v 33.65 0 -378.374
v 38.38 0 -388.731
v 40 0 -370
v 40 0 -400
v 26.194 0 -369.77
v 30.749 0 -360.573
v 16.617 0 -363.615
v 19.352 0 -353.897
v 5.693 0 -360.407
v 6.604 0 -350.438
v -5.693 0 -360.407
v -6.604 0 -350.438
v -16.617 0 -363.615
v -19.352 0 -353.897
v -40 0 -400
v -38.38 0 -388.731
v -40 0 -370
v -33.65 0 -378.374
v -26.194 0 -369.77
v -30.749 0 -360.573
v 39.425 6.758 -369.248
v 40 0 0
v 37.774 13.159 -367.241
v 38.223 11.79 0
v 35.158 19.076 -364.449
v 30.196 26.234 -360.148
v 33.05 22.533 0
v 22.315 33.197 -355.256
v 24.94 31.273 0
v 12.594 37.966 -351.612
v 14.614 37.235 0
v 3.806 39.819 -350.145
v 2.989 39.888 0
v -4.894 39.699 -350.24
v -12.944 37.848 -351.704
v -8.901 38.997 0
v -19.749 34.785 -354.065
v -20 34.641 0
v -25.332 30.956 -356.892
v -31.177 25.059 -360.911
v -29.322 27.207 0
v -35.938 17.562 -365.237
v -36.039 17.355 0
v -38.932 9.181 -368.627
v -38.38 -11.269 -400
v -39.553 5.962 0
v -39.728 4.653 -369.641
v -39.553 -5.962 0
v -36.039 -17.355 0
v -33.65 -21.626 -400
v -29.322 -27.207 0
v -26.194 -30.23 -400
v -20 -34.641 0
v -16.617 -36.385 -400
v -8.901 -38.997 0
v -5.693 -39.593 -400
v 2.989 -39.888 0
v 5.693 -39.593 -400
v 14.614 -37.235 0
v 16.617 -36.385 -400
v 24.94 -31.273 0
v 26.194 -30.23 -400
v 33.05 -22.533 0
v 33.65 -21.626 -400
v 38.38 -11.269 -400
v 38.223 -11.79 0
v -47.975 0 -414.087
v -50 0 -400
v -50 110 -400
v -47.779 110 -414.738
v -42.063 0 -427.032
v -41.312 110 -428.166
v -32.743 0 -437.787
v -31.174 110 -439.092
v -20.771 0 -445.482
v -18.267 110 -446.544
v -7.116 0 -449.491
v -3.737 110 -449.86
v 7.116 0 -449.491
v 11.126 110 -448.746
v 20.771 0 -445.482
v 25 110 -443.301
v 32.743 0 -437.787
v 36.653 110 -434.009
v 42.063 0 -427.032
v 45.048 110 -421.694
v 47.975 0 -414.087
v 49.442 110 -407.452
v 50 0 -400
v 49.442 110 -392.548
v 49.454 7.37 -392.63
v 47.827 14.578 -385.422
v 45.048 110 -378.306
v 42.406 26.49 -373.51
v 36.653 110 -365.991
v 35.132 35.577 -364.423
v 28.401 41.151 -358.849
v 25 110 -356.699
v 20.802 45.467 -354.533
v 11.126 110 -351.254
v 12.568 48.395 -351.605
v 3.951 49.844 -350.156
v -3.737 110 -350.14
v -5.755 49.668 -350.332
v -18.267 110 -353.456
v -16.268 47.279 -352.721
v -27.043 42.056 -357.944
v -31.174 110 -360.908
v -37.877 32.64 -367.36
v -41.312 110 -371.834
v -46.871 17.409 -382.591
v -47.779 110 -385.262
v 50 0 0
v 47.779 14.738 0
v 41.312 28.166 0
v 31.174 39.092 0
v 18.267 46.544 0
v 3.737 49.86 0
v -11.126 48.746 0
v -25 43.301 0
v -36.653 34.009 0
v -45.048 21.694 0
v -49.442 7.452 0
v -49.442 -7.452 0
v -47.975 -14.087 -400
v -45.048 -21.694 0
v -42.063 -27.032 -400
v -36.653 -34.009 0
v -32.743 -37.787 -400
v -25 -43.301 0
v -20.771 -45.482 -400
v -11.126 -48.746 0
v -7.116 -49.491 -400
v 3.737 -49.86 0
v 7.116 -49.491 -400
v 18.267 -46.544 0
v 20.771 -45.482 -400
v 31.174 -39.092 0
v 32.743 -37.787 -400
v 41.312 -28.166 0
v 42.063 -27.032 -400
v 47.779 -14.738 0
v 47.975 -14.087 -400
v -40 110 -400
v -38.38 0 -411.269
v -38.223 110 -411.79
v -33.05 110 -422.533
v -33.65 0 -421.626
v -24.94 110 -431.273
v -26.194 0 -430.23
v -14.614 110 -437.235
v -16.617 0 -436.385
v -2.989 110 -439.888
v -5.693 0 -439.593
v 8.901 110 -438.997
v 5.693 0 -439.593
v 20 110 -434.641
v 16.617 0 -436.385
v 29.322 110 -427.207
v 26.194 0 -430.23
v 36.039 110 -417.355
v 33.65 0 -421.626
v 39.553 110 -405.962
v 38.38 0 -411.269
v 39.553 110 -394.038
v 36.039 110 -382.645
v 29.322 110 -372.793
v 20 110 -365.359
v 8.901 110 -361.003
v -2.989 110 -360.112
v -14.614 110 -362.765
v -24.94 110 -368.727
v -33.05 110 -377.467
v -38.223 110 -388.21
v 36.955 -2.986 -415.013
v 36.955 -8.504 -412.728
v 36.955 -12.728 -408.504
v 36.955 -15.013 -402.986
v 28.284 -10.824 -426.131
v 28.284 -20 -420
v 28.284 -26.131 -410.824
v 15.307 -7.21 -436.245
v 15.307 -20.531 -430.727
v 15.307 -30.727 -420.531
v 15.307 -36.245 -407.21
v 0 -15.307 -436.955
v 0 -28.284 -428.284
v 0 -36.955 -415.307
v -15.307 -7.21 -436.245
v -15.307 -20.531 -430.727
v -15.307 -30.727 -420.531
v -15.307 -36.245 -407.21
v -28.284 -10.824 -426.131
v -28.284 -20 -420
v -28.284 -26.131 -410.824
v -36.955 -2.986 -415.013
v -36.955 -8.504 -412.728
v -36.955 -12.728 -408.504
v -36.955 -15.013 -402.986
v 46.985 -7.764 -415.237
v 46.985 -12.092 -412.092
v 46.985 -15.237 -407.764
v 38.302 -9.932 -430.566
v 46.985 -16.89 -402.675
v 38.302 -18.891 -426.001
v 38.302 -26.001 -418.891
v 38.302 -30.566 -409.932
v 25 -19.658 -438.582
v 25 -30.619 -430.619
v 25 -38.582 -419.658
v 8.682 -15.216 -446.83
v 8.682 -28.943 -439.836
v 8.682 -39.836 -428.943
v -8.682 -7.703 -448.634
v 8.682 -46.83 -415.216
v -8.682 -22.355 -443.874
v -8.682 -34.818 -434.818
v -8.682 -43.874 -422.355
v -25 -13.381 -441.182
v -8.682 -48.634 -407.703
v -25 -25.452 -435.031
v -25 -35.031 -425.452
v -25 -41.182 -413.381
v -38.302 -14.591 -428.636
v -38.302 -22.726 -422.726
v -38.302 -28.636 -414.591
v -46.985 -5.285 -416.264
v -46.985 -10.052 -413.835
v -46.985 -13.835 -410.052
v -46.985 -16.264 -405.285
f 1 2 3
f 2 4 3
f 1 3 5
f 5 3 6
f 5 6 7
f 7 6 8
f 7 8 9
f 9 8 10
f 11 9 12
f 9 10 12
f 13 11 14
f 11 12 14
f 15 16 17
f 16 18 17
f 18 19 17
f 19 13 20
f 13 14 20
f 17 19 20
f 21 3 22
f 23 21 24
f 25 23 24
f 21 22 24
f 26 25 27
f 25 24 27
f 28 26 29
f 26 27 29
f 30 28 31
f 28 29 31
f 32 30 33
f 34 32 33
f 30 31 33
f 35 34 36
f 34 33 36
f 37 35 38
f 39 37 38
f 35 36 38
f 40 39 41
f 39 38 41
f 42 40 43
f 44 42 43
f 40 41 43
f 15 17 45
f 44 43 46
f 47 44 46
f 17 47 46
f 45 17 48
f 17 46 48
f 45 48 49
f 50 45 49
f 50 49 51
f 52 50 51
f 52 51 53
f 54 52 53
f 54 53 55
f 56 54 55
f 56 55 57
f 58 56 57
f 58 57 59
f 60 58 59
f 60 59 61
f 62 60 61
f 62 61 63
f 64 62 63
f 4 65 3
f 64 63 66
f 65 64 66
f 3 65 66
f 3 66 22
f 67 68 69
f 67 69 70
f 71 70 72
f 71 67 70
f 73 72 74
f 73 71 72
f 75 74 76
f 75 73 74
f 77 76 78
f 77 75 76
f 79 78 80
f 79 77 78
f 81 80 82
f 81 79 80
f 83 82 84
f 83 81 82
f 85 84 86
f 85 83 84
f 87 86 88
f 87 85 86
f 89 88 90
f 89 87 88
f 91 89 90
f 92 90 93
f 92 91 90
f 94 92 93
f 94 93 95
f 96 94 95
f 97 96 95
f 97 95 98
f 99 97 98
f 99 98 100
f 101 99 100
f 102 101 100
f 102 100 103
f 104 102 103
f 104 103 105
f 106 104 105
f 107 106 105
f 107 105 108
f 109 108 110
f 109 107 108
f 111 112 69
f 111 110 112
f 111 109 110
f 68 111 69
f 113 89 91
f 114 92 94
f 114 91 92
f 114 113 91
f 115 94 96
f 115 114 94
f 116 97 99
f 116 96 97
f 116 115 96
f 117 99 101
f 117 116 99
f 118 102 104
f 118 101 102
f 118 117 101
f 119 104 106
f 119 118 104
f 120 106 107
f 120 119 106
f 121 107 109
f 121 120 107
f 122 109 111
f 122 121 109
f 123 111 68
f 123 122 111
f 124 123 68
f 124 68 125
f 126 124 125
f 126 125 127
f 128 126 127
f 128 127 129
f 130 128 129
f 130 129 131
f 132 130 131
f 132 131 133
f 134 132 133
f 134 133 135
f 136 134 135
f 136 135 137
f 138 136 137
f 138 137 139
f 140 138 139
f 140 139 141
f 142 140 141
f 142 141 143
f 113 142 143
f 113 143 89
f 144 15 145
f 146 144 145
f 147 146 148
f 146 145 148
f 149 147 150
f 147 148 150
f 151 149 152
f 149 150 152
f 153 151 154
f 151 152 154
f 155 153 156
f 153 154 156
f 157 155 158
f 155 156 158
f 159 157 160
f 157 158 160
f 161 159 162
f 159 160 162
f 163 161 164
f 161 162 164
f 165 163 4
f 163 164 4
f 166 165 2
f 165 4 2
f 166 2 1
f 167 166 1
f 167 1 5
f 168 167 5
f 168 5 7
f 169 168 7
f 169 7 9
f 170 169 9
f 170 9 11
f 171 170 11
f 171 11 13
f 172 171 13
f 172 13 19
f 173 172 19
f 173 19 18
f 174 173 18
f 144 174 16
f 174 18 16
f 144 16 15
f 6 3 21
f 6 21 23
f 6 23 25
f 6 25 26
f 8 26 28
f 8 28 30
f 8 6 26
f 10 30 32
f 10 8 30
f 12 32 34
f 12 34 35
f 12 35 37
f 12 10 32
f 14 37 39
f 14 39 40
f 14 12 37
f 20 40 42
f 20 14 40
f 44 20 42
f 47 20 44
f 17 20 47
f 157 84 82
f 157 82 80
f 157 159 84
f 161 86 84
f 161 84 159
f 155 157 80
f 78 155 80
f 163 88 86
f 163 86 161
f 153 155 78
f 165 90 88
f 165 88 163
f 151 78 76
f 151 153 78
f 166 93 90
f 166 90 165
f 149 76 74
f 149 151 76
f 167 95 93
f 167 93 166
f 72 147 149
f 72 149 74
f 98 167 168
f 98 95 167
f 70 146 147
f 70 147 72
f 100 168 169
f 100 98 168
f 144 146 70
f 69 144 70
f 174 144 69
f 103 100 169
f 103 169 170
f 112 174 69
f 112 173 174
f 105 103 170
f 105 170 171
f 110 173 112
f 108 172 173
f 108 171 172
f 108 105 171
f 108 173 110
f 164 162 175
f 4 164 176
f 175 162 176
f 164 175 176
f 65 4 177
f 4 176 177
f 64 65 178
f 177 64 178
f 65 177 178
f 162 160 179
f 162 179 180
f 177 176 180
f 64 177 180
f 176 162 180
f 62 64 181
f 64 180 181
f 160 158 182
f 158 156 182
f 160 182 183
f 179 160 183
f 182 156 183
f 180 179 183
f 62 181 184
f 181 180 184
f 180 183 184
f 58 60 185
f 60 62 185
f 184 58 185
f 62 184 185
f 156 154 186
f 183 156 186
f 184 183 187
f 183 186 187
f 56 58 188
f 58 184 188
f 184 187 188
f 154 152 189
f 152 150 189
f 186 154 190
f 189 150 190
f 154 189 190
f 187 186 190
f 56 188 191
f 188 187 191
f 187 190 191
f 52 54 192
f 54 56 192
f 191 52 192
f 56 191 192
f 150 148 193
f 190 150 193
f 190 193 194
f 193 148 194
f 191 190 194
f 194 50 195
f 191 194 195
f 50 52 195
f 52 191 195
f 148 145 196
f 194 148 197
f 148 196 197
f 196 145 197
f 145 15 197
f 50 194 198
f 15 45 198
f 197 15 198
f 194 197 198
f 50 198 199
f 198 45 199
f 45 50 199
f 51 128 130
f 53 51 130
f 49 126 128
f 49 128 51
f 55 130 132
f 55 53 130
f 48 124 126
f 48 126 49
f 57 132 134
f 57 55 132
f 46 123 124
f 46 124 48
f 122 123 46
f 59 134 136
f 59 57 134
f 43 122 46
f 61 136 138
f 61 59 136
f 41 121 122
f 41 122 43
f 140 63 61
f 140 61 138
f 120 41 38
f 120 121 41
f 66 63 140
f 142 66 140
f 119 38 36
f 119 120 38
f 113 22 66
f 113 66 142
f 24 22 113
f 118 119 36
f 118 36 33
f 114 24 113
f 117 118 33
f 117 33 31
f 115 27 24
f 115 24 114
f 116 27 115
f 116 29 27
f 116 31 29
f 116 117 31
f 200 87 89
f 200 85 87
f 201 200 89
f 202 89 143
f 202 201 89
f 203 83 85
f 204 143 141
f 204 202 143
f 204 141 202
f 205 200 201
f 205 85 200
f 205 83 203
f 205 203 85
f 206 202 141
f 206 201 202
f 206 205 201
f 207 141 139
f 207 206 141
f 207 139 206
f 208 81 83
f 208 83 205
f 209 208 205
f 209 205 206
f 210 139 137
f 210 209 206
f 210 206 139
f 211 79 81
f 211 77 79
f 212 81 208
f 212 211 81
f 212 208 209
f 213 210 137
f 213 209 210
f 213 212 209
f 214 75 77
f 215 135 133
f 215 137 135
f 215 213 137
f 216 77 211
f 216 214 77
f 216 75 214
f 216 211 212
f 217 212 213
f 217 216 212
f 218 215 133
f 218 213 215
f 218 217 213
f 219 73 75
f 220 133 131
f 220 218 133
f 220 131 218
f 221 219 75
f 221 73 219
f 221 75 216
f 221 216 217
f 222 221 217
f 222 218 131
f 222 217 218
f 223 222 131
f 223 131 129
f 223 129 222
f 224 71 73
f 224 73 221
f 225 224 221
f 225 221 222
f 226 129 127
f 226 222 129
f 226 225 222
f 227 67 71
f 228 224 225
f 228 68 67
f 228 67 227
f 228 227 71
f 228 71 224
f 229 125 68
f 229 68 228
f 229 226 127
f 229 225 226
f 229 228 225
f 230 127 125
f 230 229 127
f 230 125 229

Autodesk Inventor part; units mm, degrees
sketch "Sketch1" plane through (0, 0, 0) normal (0, 0, 1) x (1, 0, 0)
  circle A0 centre (0, 0) radius 50
  circle A1 centre (0, 0) radius 40
  dimension "d0" = 100
  dimension "d1" = 80
extrude "Extrusion1" add sketch "Sketch1" against normal blind 400
ref_plane "Work Plane1" through (0, 0, -400) normal (0, 0, -1) x (-1, 0, 0)
sketch "Sketch2" plane through (0, 0, -400) normal (0, 0, -1) x (-1, 0, 0)
  circle A0 centre (0, 0) radius 50 projected
  circle A1 centre (0, 0) radius 40 projected
  line L0 (0, 0) -> (0, 50)
sketch "Sketch3" plane through (0, 0, 0) normal (0, 1, 0) x (-1, 0, 0)
  point P0 (0, 0)
sketch "Sketch4" plane through (0, 0, 0) normal (0, 1, 0) x (-1, 0, 0)
  line L0 (70, -400) -> (-70, -400) projected
  line L1 (-50, -400) -> (50, -400) projected
  circle A0 centre (0, -400) radius 40
  circle A1 centre (0, -400) radius 50
  point P0 (0, 0)
  point P1 (40, -400)
  point P2 (-40, -400)
  dimension "d5" = 80
  dimension "d6" = 100
sketch "Sketch6" plane through (0, 0, 0) normal (0, 1, 0) x (-1, 0, 0)
  point P0 (0, 0)
sketch "Sketch7" plane through (0, 0, 0) normal (0, 1, 0) x (-1, 0, 0)
  line L0 (-40, -400) -> (-40, -400) projected
  circle A0 centre (0, -400) radius 40
  line L1 (-50, -400) -> (-50, -400) projected
  circle A1 centre (0, -400) radius 50
  point P0 (0, 0)
  point P1 (50, -400)
  point P2 (40, -400)
ref_plane "Work Plane4" through (50, 0, -400) normal (0, 0.7071, -0.7071) x (-1, 0, 0)
split "Split2" plane through (50, 0, -400) removes the side toward (0, 0.7071, -0.7071)
extrude "Extrusion3" add sketch "Sketch7" along normal blind 110
revolve "Revolution2" add sketch "Sketch4" angle 90 about axis through (0, 0, -400) along (-1, 0, 0) picked at (-46.3464, -403.2515) contours A1 L0 A0
ref_plane "Work Plane5" through (0, 110, -400) normal (0, 1, 0) x (1, 0, 0)
properties part number "Z2" material "Steel, Alloy"
